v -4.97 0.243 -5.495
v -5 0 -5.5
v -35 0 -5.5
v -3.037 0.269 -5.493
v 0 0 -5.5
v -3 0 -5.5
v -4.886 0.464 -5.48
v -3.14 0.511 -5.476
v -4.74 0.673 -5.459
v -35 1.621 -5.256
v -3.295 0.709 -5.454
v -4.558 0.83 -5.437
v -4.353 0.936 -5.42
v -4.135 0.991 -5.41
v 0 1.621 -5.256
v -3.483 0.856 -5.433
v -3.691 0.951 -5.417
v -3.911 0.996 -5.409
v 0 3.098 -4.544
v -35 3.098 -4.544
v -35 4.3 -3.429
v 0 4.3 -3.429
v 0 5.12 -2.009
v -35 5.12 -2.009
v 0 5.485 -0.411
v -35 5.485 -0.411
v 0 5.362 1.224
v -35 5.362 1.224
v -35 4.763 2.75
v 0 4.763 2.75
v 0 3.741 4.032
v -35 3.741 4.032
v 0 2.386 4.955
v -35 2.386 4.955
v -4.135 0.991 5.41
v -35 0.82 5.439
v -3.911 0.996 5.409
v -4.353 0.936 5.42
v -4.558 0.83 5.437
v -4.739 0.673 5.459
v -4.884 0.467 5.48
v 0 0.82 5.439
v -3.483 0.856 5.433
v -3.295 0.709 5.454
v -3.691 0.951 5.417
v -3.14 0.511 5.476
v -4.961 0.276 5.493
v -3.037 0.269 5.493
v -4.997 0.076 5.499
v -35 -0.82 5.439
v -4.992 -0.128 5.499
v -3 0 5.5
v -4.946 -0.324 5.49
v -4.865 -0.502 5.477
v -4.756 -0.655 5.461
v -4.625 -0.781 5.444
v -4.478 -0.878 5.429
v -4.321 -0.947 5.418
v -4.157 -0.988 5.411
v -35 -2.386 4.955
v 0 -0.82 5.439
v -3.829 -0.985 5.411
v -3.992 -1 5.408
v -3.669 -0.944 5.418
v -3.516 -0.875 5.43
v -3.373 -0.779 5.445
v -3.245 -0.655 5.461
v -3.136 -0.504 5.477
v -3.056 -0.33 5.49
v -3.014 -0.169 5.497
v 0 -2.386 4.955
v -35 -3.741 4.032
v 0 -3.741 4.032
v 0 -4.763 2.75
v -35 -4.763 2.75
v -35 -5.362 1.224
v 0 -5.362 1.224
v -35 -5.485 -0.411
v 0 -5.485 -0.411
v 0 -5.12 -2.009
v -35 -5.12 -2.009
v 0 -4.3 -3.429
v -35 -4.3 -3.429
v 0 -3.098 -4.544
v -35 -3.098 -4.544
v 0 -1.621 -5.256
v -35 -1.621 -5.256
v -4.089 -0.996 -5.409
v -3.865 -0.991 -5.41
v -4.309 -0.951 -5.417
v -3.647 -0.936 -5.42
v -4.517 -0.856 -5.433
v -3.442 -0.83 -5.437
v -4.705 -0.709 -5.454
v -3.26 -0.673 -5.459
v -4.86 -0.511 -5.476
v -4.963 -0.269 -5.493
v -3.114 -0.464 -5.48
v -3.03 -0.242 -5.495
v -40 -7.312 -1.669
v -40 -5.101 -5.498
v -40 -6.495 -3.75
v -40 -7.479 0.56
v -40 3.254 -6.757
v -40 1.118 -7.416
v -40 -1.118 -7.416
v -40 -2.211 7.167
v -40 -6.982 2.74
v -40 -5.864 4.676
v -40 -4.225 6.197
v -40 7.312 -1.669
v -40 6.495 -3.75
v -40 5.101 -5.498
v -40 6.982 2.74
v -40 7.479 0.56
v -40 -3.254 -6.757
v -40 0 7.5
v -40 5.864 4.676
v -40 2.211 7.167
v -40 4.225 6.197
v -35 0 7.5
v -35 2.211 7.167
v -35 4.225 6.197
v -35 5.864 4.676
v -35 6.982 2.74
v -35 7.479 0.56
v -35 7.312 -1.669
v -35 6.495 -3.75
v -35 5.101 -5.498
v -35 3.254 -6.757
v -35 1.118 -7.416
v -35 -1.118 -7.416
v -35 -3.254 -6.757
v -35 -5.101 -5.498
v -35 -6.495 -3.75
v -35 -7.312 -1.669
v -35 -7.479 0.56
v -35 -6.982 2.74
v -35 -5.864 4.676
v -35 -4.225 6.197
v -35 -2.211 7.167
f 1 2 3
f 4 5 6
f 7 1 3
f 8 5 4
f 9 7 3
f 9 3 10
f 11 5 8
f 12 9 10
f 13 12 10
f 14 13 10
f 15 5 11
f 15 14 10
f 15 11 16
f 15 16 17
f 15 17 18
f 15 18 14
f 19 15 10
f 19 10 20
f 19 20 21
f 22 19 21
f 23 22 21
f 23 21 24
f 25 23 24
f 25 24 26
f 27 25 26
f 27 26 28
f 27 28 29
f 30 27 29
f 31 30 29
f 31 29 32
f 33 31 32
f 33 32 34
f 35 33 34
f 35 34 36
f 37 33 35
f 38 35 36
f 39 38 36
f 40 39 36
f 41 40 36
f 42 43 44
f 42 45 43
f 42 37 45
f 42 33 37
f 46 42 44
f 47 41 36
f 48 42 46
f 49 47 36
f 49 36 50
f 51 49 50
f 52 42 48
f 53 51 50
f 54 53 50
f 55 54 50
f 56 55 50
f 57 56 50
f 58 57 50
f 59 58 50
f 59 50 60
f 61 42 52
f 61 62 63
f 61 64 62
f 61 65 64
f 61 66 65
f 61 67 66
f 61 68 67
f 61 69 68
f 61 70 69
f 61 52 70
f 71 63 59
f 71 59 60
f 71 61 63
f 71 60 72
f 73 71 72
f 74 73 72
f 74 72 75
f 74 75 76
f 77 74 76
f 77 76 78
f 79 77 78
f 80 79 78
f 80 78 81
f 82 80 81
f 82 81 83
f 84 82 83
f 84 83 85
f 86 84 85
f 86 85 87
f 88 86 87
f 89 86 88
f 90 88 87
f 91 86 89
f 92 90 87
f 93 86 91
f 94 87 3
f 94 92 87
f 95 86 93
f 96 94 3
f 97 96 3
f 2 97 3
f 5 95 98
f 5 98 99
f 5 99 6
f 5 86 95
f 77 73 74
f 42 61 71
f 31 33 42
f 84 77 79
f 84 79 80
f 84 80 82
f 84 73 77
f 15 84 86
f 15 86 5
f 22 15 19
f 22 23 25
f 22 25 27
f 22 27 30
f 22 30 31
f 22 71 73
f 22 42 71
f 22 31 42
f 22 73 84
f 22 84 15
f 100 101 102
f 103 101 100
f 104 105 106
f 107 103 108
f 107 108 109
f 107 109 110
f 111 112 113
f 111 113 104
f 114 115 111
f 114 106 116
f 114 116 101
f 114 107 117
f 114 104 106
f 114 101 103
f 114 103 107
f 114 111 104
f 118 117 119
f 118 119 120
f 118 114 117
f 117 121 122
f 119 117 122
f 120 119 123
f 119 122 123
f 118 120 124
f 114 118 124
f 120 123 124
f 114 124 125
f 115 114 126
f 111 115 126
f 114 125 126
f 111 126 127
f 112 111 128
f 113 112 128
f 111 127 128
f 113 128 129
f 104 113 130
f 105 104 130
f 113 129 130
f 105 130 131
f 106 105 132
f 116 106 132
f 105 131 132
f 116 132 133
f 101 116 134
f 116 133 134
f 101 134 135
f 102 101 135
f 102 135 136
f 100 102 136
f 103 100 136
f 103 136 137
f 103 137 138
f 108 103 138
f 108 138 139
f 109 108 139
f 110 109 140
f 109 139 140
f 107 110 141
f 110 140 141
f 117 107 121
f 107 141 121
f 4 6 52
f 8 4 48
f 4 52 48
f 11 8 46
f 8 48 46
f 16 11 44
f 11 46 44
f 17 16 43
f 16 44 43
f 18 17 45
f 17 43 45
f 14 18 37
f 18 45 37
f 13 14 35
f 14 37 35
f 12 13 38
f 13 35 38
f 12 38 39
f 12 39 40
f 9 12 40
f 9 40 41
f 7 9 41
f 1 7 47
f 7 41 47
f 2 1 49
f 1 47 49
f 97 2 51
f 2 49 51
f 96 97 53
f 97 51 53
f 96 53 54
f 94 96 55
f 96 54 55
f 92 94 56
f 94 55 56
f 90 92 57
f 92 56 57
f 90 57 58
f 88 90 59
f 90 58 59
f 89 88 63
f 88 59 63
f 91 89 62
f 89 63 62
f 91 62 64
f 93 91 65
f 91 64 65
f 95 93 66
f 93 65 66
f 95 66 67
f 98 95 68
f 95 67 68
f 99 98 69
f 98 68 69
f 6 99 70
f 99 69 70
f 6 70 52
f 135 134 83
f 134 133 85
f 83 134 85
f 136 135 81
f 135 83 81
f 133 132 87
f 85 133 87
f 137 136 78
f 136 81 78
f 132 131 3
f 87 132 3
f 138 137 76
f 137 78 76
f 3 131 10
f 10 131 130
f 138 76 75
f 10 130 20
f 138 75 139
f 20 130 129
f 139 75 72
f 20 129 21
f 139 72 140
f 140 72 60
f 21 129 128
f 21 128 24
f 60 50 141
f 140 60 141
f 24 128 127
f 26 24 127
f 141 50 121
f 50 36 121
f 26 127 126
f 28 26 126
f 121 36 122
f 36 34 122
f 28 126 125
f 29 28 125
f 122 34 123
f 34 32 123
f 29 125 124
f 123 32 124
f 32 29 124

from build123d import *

# Parameters (mm, degrees)
SKETCH1_R               = 5.5
BOSS_EXTRUDE1_DEPTH     = 35
SKETCH2_R               = 7.5
BOSS_EXTRUDE2_DEPTH     = 5
SKETCH3_R               = 1
CUT_EXTRUDE1_DEPTH      = 8.5
CUT_EXTRUDE1_DEPTH_BACK = 8.5


with BuildPart() as part:
    # Sketch1 → Boss-Extrude1 (new body)
    with BuildSketch(Plane(origin=(0, 0, 0), x_dir=(0, 0, -1), z_dir=(1, 0, 0))):
        Circle(SKETCH1_R)
    extrude(amount=-BOSS_EXTRUDE1_DEPTH)

    # Sketch2 → Boss-Extrude2 (add)
    with BuildSketch(Plane.ZY.offset(35)):
        Circle(SKETCH2_R)
    extrude(amount=BOSS_EXTRUDE2_DEPTH)

    # Sketch3 → Cut-Extrude1 (cut, two sides)
    with BuildSketch(Plane.XY) as cut_extrude1_sk:
        with Locations((-4, 0)):
            Circle(SKETCH3_R)
    extrude(amount=CUT_EXTRUDE1_DEPTH, mode=Mode.SUBTRACT)
    extrude(cut_extrude1_sk.sketch, amount=-CUT_EXTRUDE1_DEPTH_BACK, mode=Mode.SUBTRACT)


solid = part.part
